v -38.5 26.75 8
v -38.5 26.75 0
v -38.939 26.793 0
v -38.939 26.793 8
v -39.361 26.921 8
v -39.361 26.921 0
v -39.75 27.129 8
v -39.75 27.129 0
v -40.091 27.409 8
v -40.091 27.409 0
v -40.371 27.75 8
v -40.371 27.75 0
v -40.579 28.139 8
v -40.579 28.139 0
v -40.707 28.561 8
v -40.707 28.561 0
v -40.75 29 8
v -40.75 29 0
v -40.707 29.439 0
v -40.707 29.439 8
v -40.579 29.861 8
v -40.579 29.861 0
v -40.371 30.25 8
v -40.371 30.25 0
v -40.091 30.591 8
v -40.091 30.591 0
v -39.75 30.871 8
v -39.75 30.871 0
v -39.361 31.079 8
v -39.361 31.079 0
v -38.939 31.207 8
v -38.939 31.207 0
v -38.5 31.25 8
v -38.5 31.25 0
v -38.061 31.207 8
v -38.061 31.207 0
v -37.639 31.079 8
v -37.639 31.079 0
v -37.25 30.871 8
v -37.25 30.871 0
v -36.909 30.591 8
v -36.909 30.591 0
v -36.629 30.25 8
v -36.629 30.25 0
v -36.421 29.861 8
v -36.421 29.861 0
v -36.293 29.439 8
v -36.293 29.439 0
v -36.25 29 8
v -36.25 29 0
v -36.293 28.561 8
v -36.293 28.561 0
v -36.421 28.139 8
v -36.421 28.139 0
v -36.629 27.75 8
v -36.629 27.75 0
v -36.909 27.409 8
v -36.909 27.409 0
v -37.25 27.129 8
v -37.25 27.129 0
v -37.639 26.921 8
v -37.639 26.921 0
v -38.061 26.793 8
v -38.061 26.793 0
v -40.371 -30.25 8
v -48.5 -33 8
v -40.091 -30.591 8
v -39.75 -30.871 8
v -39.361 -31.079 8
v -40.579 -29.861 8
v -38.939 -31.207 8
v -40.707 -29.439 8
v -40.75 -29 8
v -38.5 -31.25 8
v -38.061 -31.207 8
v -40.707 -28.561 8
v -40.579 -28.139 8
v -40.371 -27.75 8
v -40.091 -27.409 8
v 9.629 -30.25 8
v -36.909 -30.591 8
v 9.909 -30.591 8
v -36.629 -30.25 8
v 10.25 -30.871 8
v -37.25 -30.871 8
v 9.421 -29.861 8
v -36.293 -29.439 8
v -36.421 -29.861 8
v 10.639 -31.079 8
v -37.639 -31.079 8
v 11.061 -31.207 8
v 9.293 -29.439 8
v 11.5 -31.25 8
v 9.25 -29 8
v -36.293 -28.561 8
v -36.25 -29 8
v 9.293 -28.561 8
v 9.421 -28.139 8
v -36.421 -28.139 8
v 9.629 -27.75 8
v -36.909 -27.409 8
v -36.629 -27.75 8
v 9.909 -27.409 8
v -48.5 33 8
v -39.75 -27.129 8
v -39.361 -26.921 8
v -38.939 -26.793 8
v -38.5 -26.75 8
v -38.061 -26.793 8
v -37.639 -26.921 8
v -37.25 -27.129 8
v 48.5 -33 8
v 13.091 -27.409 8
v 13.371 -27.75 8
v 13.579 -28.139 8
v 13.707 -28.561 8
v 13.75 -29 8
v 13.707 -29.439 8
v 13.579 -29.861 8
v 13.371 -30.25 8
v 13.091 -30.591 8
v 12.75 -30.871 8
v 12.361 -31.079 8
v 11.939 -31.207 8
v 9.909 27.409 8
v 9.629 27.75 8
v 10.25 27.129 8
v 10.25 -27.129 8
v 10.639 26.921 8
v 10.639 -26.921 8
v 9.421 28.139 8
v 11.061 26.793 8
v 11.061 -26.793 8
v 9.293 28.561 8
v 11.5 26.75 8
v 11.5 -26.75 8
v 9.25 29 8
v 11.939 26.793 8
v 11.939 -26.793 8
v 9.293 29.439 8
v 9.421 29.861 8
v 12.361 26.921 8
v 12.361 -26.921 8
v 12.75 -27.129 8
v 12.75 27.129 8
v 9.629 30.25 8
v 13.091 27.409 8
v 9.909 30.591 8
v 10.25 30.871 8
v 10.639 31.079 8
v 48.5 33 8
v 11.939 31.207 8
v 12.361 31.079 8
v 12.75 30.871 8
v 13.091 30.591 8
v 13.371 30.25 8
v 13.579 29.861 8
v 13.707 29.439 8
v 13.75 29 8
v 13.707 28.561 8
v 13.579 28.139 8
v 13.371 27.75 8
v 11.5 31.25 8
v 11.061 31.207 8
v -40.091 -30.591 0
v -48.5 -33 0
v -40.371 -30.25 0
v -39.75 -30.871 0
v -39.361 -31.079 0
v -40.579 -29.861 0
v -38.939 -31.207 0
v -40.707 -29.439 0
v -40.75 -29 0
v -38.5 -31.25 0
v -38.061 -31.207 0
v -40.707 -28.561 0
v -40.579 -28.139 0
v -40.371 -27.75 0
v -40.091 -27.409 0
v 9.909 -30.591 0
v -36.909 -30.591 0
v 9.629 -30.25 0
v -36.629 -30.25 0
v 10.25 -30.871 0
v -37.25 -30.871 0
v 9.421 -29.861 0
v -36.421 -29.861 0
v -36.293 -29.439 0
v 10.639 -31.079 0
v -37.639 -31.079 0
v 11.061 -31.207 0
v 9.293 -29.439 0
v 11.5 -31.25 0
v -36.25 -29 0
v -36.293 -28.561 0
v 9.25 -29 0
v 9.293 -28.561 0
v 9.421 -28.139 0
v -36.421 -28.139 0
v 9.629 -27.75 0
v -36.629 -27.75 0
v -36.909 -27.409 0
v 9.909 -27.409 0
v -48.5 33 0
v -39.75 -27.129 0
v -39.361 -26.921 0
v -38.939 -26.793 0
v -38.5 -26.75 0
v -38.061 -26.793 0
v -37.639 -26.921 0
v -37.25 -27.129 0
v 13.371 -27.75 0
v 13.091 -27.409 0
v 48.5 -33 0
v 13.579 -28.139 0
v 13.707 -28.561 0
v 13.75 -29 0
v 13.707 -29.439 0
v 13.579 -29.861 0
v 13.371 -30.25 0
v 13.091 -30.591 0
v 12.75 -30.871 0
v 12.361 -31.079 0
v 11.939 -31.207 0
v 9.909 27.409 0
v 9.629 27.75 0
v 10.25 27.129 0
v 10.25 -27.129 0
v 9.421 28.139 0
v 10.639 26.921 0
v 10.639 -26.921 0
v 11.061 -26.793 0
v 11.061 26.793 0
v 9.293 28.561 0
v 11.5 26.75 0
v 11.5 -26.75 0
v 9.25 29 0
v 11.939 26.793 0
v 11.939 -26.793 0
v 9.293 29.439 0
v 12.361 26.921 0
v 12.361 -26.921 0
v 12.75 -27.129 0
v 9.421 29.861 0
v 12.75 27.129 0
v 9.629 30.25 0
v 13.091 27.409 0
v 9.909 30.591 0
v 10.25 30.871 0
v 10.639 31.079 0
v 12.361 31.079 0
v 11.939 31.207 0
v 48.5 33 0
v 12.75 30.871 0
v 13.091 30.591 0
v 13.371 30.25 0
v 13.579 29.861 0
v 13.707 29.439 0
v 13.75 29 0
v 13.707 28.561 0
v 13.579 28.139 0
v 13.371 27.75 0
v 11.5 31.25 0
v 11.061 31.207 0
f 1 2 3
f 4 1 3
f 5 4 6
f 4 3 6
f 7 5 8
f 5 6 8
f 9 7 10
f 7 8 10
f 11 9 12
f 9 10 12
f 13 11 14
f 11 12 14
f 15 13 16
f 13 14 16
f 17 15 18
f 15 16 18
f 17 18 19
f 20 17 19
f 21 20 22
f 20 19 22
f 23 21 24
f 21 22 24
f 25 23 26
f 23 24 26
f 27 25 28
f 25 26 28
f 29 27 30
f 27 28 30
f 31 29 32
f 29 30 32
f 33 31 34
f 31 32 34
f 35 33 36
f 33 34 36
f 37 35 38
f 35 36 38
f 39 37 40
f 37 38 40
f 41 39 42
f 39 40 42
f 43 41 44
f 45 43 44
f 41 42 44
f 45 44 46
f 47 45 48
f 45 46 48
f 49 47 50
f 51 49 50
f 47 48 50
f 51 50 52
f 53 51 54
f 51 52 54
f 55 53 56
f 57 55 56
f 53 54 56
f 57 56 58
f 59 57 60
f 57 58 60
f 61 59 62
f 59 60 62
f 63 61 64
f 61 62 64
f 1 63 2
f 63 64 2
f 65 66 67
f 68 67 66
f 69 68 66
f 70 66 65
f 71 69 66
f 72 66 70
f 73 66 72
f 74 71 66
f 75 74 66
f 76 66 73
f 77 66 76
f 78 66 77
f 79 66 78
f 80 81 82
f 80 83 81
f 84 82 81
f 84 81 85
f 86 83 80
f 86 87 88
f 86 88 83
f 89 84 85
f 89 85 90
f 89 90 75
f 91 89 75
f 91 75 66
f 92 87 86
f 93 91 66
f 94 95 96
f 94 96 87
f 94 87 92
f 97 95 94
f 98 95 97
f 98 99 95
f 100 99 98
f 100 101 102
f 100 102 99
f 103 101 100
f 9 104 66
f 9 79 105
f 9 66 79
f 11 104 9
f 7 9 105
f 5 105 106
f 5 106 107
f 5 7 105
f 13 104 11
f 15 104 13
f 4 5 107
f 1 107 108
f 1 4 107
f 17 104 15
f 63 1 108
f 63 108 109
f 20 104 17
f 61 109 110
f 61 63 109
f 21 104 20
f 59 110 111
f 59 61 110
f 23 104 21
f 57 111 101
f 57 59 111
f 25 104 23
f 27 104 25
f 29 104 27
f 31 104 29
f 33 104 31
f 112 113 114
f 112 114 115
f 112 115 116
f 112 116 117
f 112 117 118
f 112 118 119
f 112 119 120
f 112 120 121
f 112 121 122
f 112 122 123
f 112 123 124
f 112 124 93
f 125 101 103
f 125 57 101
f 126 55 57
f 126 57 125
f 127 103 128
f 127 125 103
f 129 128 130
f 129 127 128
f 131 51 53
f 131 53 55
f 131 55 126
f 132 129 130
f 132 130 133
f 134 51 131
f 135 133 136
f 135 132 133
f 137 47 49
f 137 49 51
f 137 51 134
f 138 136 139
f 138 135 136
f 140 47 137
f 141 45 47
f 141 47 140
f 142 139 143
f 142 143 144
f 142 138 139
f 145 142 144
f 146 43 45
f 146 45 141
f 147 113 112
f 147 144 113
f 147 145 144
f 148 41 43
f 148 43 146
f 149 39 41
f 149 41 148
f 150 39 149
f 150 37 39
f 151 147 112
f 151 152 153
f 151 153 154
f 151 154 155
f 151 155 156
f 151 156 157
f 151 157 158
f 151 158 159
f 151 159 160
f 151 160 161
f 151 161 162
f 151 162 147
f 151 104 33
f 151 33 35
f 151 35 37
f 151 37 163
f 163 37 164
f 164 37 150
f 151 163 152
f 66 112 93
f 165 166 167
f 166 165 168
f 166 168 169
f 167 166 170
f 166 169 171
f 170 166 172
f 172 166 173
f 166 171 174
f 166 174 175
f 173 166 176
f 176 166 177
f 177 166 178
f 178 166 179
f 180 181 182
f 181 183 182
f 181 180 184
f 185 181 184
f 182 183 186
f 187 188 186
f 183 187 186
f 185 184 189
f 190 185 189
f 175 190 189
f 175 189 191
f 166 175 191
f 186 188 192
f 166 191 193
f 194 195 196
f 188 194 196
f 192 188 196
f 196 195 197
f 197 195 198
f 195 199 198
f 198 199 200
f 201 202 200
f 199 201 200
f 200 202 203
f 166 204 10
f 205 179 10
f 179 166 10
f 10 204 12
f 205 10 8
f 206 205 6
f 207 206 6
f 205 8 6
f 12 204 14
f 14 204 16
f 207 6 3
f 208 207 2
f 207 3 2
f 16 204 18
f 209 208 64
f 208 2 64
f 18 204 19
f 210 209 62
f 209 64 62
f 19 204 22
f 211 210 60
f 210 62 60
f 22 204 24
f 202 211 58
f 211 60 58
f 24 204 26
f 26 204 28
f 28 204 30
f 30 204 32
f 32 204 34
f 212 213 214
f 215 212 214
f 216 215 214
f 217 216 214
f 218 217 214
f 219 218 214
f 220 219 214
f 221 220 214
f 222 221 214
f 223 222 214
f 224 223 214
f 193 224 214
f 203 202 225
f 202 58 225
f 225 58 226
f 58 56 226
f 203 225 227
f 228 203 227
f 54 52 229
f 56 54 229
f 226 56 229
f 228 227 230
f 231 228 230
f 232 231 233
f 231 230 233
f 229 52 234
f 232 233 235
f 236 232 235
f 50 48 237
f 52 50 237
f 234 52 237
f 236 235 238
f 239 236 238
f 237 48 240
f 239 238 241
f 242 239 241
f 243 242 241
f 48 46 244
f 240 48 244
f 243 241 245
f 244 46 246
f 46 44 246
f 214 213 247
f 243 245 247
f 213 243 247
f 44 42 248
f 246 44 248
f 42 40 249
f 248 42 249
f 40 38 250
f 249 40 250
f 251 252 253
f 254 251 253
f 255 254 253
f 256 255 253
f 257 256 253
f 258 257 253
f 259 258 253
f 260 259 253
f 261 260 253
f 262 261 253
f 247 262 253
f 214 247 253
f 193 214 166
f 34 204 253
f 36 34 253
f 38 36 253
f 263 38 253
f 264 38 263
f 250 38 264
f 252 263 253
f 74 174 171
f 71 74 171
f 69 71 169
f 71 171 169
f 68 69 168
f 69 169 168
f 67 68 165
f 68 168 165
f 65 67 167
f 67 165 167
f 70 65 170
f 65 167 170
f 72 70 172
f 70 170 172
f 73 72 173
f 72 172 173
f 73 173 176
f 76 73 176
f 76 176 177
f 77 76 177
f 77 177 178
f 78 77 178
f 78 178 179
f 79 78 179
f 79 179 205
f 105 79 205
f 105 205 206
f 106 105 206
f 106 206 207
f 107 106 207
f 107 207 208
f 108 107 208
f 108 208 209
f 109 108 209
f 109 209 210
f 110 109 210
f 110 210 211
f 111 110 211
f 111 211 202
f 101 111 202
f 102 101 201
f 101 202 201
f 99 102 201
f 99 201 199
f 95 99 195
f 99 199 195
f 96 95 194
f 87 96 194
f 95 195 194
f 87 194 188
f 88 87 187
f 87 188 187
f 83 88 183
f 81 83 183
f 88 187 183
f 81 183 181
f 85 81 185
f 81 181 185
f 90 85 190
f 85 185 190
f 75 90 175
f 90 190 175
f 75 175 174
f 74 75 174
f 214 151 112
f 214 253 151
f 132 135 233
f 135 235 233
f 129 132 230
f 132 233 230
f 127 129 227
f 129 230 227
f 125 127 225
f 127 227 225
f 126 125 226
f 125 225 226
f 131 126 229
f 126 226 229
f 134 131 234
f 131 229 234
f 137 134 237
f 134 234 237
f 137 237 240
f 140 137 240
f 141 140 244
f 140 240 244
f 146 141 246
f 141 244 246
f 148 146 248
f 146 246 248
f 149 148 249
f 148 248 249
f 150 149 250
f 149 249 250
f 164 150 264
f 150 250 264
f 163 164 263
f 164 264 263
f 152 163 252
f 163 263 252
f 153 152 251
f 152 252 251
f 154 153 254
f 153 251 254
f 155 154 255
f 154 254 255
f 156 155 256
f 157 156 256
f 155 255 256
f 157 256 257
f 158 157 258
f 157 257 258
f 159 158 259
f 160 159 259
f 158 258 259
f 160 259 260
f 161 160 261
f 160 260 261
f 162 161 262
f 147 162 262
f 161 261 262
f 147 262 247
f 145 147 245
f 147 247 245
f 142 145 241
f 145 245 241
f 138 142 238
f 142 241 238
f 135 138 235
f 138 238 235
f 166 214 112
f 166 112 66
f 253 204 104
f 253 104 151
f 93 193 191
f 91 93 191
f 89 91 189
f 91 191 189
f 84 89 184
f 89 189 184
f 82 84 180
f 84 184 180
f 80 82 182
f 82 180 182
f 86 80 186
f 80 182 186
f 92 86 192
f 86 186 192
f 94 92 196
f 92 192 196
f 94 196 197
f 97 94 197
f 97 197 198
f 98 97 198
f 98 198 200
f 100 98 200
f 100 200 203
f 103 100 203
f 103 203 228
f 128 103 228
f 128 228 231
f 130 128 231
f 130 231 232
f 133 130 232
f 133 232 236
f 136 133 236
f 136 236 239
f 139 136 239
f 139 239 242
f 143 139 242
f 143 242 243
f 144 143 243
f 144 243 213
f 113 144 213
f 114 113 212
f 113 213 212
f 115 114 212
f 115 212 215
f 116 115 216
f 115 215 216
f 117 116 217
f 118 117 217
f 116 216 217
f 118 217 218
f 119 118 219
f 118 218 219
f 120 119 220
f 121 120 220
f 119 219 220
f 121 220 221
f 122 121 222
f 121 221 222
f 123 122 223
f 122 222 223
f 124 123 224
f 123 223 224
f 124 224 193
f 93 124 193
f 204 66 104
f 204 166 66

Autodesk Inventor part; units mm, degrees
ref_plane "YZ Plane" through (0, 0, 0) normal (1, 0, 0) x (0, 1, 0)
ref_plane "XZ Plane" through (0, 0, 0) normal (0, 1, 0) x (-1, 0, 0)
ref_plane "XY Plane" through (0, 0, 0) normal (0, 0, 1) x (1, 0, 0)
sketch "Sketch1" plane through (0, 0, 0) normal (0, 0, 1) x (1, 0, 0)
  line L0 (-48.5, 33) -> (48.5, 33)
  line L1 (48.5, 33) -> (48.5, -33)
  line L2 (48.5, -33) -> (-48.5, -33)
  line L3 (-48.5, -33) -> (-48.5, 33)
  point P0 (0, 0)
  point P1 (0, 33)
  point P2 (-48.5, 0)
  dimension "d0" = 97
  dimension "d1" = 66
extrude "Extrusion1" add sketch "Sketch1" along normal blind 8
sketch "Sketch4" plane through (0, 0, 8) normal (0, 0, 1) x (1, 0, 0)
  line L0 (-48.5, 33) -> (-48.5, -33) projected
  line L1 (-48.5, -33) -> (48.5, -33) projected
  line L2 (48.5, 33) -> (-48.5, 33) projected
  point P0 (0, 0)
  point P1 (-38.5, -29)
  point P2 (-38.5, 29)
  dimension "d19" = 10
  dimension "d20" = 4
  dimension "d21" = 4
hole "Hole1" at (-38.5, -29, 8) at (-38.5, 29, 8) direction (0, 0, -1) diameter 4.5 end through all
pattern_linear "Rectangular Pattern1" count 2 spacing 50 along (1, 0, 0) of "Hole1"
equation "\"d21\" = d20"
properties part number "0005-10-009"
